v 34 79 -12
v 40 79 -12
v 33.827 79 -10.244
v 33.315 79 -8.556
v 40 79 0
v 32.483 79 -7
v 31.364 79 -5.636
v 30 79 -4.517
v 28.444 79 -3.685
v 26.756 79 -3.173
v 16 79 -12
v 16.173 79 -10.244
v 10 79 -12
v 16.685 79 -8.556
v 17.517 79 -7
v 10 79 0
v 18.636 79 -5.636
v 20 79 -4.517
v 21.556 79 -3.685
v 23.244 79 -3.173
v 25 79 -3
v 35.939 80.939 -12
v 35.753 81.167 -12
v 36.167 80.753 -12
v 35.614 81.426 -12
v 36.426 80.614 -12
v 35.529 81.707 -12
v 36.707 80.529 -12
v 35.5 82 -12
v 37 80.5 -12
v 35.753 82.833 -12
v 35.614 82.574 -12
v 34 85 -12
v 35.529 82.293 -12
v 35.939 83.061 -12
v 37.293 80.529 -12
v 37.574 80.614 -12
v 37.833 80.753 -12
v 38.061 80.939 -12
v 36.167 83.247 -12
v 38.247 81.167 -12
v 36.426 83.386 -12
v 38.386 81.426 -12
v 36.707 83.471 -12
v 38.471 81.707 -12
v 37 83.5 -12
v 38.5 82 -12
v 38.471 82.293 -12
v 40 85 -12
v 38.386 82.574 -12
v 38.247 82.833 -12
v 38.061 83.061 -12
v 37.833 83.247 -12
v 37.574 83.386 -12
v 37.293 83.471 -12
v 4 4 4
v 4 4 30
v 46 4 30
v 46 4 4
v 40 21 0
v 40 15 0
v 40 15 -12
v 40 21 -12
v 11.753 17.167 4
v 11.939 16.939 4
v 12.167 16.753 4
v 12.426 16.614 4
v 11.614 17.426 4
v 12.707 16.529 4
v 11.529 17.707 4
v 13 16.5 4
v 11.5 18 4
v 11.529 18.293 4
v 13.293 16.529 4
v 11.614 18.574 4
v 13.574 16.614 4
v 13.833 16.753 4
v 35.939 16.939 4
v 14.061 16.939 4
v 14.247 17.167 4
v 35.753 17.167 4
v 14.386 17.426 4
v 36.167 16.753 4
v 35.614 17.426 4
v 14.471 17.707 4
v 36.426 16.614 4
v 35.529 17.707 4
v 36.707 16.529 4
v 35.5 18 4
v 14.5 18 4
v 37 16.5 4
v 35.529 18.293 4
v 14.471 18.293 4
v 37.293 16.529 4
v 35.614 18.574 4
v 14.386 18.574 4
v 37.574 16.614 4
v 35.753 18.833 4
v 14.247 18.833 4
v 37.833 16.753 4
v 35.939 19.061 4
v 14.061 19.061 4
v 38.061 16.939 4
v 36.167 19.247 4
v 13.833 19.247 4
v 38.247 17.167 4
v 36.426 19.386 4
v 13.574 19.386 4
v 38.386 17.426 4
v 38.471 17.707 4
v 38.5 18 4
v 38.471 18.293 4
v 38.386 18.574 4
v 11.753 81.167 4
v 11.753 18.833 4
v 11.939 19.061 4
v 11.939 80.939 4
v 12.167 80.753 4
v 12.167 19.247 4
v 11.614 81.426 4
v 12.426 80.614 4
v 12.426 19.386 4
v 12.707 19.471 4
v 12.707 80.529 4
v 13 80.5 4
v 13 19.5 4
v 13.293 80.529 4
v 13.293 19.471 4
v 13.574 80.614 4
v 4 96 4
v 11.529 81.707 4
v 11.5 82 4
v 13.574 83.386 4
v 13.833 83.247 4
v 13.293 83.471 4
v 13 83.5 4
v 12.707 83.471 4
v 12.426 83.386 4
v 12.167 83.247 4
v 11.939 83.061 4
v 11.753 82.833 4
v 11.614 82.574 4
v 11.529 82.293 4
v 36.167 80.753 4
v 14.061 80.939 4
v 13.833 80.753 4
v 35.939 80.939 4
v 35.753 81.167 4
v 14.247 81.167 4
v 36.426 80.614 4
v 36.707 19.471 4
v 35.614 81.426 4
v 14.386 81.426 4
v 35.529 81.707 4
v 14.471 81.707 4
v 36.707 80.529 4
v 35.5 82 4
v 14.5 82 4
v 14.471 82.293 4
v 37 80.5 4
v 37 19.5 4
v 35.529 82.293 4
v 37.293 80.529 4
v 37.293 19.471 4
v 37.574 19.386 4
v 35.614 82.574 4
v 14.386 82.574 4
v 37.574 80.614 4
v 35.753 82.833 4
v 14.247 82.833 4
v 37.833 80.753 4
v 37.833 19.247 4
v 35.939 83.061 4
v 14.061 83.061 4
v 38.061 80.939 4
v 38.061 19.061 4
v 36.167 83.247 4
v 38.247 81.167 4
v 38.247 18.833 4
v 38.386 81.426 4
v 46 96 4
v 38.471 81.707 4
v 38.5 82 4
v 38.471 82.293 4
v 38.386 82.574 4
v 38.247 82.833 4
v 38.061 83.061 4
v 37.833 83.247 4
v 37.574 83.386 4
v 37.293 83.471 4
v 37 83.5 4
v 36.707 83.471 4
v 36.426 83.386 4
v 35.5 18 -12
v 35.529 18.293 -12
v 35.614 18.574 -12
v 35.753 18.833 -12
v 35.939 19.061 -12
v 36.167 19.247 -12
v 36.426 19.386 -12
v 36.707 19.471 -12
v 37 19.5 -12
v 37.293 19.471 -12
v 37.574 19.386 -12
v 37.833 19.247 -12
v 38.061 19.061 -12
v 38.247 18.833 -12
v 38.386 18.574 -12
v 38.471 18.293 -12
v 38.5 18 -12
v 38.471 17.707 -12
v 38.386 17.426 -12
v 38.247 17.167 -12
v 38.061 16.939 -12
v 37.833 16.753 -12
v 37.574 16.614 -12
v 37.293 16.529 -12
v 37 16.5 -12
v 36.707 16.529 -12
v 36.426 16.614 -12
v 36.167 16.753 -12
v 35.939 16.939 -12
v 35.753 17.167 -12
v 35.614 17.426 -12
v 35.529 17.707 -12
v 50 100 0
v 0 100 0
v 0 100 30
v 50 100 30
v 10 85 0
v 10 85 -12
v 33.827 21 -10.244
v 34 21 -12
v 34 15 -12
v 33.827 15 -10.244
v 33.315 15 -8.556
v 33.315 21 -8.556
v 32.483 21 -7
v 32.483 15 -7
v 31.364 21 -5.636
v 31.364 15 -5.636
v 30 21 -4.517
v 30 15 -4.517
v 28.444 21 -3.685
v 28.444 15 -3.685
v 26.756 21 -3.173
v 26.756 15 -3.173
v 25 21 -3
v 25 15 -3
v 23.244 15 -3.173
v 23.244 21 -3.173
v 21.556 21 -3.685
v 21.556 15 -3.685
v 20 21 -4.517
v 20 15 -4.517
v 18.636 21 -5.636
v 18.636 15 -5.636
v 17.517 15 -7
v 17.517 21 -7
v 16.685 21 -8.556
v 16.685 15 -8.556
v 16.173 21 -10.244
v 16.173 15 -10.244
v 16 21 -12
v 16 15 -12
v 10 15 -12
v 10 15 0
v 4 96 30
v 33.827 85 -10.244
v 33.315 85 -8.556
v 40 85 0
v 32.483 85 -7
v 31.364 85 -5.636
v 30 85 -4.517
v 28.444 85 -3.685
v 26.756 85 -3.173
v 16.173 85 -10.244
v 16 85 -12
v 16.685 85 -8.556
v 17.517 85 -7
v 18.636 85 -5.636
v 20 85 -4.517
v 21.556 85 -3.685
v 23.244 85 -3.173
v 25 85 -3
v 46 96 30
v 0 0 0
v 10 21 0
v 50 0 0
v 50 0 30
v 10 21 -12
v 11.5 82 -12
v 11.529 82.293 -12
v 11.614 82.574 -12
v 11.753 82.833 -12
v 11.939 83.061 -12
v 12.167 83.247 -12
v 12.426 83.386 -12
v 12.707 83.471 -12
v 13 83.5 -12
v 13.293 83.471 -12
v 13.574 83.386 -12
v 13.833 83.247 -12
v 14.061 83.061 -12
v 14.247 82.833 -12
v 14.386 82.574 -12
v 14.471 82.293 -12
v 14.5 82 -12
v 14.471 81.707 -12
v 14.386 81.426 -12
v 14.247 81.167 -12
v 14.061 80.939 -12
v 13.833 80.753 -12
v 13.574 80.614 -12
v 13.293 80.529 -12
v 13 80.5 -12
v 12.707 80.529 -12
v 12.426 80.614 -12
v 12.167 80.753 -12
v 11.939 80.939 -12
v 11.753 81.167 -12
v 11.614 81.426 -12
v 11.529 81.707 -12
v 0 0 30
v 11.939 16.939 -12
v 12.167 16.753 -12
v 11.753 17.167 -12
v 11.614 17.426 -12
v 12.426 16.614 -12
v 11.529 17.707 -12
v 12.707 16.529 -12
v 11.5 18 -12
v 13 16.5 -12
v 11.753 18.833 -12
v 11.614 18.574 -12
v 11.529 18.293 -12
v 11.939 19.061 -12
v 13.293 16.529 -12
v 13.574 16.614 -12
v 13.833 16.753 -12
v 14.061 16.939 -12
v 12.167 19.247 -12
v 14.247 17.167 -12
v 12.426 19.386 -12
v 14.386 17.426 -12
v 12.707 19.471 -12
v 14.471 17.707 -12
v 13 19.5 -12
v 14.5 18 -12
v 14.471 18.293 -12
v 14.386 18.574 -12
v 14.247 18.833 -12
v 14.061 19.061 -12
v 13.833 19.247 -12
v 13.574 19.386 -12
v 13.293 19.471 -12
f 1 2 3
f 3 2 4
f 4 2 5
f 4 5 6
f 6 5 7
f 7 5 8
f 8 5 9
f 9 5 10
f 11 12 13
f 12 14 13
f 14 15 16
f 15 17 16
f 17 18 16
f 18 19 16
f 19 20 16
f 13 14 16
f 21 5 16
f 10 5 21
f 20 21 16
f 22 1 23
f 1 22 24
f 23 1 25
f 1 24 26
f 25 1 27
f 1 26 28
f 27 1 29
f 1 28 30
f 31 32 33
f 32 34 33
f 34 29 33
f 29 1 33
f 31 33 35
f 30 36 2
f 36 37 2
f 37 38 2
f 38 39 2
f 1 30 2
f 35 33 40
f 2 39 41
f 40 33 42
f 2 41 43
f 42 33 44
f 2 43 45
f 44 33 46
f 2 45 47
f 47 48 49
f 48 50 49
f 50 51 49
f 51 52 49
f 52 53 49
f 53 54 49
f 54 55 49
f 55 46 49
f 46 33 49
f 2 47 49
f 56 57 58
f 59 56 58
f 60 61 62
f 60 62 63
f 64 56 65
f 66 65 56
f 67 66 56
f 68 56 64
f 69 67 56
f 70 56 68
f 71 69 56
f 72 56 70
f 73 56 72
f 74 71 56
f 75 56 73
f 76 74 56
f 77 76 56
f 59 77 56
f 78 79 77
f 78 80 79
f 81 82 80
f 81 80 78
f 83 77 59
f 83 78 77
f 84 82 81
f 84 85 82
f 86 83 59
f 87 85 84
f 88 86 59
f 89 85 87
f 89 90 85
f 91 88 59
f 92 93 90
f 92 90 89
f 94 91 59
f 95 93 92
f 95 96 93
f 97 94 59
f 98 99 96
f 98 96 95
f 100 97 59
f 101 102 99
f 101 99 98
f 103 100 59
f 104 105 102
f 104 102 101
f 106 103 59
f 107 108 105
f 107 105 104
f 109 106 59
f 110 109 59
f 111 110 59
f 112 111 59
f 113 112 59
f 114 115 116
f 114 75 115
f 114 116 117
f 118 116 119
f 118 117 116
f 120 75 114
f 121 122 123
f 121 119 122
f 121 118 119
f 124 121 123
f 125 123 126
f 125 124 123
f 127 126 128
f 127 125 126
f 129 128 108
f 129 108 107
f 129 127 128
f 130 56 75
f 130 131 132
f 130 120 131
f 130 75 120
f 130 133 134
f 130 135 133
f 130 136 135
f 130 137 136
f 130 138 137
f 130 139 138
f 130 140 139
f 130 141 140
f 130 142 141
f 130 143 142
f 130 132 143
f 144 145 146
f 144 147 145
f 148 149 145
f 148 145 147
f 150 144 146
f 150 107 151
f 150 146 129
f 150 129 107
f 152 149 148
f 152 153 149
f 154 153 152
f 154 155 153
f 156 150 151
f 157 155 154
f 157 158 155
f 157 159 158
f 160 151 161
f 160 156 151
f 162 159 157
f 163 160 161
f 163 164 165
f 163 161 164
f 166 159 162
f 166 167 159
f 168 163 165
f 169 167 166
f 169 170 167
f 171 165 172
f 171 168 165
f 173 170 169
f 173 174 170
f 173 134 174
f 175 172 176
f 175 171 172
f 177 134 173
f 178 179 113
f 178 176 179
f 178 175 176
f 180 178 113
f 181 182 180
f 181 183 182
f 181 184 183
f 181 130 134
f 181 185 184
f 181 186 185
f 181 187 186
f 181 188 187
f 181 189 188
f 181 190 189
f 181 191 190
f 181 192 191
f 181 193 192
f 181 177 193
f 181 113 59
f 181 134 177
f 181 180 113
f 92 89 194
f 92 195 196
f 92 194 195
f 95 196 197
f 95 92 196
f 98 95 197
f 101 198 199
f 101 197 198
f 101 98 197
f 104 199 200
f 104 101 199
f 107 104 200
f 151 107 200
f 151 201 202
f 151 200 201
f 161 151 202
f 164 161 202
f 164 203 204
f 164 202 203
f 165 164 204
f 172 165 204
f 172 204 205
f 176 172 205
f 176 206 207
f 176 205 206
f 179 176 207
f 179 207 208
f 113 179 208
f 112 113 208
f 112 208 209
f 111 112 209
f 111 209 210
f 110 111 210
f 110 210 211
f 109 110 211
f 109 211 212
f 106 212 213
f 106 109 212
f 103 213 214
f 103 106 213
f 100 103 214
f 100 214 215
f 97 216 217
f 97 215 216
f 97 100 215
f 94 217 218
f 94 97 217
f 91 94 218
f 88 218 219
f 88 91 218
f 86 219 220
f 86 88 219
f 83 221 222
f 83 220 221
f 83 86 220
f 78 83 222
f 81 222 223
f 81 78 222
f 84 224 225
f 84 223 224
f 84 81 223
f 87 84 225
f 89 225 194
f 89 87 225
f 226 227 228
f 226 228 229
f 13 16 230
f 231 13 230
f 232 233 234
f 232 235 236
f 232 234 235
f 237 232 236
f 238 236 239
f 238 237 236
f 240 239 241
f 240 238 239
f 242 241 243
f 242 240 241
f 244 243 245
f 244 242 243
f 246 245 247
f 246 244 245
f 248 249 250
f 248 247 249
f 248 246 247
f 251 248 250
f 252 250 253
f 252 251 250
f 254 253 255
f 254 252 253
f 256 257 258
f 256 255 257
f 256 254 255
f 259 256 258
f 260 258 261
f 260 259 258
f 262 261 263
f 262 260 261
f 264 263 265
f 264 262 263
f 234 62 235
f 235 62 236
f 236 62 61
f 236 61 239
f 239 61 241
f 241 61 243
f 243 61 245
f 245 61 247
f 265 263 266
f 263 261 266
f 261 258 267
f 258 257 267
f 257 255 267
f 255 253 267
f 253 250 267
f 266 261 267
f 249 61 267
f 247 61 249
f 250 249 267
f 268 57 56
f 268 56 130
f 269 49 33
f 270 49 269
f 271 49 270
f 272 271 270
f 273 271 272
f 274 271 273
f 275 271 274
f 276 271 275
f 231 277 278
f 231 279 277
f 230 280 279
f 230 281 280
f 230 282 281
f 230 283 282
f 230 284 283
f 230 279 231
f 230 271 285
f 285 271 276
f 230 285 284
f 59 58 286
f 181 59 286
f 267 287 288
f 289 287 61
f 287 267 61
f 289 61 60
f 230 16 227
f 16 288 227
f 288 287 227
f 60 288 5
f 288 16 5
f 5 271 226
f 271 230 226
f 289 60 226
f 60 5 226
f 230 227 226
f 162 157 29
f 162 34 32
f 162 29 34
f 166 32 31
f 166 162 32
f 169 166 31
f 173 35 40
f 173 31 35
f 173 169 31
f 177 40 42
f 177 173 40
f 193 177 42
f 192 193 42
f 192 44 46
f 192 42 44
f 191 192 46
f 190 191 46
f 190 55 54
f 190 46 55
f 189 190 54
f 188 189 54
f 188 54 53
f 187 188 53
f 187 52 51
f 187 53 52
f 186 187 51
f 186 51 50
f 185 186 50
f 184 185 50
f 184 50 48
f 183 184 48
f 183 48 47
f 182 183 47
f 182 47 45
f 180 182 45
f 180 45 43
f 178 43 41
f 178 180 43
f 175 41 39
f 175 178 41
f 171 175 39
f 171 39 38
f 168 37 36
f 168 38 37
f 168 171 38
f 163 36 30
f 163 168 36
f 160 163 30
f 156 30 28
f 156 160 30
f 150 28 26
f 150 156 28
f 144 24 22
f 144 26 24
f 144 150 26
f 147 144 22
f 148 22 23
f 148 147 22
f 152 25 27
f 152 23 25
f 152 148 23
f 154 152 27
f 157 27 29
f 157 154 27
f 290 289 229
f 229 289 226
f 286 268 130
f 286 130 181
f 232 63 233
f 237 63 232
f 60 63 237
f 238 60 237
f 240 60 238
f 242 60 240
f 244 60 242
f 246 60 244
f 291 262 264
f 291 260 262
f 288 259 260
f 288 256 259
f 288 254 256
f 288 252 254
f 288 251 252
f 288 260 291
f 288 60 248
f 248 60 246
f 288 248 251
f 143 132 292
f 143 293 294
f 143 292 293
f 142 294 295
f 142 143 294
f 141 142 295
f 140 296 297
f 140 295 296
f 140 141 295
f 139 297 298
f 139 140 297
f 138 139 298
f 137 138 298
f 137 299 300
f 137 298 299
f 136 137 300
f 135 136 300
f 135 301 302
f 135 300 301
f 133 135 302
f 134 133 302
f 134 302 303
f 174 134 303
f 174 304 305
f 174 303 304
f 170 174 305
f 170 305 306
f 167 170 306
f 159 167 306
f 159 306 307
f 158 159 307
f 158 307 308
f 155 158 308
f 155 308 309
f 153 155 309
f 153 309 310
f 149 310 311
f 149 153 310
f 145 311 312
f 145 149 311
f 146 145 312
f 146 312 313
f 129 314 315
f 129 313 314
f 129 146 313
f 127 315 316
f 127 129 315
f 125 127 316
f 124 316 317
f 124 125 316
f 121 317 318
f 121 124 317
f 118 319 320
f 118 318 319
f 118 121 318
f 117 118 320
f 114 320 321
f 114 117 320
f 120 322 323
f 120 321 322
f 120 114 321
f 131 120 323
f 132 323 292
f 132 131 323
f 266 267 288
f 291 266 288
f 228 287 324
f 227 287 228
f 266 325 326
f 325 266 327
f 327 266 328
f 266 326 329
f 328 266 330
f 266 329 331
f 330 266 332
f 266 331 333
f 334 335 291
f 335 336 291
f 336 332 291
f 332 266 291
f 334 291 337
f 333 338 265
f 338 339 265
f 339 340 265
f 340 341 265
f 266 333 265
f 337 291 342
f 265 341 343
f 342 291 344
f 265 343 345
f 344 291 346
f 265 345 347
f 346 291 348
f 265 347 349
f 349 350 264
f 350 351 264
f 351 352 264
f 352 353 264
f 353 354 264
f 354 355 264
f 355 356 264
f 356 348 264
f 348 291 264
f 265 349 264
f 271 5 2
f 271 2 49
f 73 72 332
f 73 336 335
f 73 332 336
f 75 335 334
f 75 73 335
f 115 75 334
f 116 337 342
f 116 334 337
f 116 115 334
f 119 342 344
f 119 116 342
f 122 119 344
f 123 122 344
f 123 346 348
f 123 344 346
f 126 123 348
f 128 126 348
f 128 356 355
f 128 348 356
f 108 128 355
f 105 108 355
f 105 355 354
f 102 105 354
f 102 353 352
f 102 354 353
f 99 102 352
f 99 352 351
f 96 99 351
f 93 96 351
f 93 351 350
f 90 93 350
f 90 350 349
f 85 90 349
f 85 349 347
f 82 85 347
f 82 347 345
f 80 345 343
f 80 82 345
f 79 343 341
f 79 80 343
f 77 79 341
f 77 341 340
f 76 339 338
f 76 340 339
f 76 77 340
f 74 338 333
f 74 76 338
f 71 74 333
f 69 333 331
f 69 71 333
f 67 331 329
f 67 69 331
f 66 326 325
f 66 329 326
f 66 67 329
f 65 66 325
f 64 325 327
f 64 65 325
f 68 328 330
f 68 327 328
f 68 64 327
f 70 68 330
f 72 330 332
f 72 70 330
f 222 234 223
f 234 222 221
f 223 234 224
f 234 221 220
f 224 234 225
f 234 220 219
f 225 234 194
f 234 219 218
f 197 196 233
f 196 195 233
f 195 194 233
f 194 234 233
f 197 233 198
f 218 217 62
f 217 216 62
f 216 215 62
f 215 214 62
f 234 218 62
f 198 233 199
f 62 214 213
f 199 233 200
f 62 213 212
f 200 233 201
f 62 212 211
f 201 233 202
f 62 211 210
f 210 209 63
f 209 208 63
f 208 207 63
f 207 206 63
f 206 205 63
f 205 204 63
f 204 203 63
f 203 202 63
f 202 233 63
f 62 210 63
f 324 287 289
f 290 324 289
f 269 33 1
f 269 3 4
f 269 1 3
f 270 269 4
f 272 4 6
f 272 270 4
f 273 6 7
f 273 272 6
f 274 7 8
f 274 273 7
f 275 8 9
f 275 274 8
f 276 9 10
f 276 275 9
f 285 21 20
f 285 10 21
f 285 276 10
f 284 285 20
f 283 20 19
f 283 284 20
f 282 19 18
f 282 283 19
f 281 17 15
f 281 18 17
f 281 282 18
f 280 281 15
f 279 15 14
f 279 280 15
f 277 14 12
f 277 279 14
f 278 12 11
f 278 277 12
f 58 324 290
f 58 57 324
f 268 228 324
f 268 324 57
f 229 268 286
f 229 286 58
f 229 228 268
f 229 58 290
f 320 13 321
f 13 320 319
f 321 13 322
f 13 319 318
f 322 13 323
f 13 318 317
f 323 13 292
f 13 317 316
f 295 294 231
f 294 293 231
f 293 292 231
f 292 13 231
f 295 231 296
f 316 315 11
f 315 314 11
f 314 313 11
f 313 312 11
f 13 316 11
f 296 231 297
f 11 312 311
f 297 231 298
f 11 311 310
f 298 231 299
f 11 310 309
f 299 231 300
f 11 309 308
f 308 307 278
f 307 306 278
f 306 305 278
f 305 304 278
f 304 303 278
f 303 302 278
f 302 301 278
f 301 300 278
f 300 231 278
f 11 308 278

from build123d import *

# Parameters (mm, degrees)
SKETCH1_W               = 50
SKETCH1_H               = 100
BOSS_EXTRUDE1_DEPTH     = 30
SKETCH2_W               = 42
SKETCH2_H               = 92
CUT_EXTRUDE1_DEPTH      = 26
SKETCH3_W               = 30
SKETCH3_H               = 6
BOSS_EXTRUDE2_DEPTH     = 24
CUT_EXTRUDE2_DEPTH      = 104.07764064
CUT_EXTRUDE2_DEPTH_BACK = 104.07764064
SKETCH4_R               = 9
CUT_EXTRUDE3_DEPTH      = 125.161185561
CUT_EXTRUDE3_DEPTH_BACK = 125.161185561
SKETCH5_R               = 1.5
CUT_EXTRUDE4_DEPTH      = 104.07764064
CUT_EXTRUDE4_DEPTH_BACK = 104.07764064
SKETCH6_W               = 30
SKETCH6_H               = 12


with BuildPart() as part:
    # Sketch1 → Boss-Extrude1 (new body)
    with BuildSketch(Plane.XY):
        with Locations((25, 50)):
            Rectangle(SKETCH1_W, SKETCH1_H)
    extrude(amount=BOSS_EXTRUDE1_DEPTH)

    # Sketch2 → Cut-Extrude1 (cut)
    with BuildSketch(Plane.XY.offset(30)):
        with Locations((25, 50)):
            Rectangle(SKETCH2_W, SKETCH2_H)
    extrude(amount=-CUT_EXTRUDE1_DEPTH, mode=Mode.SUBTRACT)

    # Sketch3 → Boss-Extrude2 (add)
    with BuildSketch(Plane(origin=(0, 0, 0), x_dir=(-1, 0, 0), z_dir=(0, 0, -1))):
        with Locations((-25, 18)):
            Rectangle(SKETCH3_W, SKETCH3_H)
        with Locations((-25, 82)):
            Rectangle(SKETCH3_W, SKETCH3_H)
    extrude(amount=BOSS_EXTRUDE2_DEPTH)

    # Sketch4 → Cut-Extrude2 (cut, two sides: drawn at the far end of the back side and taken through both)
    with BuildSketch(Plane.XZ.offset(-15).offset(-CUT_EXTRUDE2_DEPTH_BACK)):
        with Locations((25, -12)):
            Circle(SKETCH4_R)
    extrude(amount=CUT_EXTRUDE2_DEPTH + CUT_EXTRUDE2_DEPTH_BACK, mode=Mode.SUBTRACT)

    # Sketch5 → Cut-Extrude3 (cut, two sides: drawn at the far end of the back side and taken through both)
    with BuildSketch(Plane(origin=(0, 0, -24), x_dir=(-1, 0, 0), z_dir=(0, 0, -1)).offset(-CUT_EXTRUDE3_DEPTH_BACK)):
        with Locations((-13, 18)):
            Circle(SKETCH5_R)
        with Locations((-37, 18)):
            Circle(SKETCH5_R)
        with Locations((-13, 82)):
            Circle(SKETCH5_R)
        with Locations((-37, 82)):
            Circle(SKETCH5_R)
    extrude(amount=CUT_EXTRUDE3_DEPTH + CUT_EXTRUDE3_DEPTH_BACK, mode=Mode.SUBTRACT)

    # Sketch6 → Cut-Extrude4 (cut, two sides: drawn at the far end of the back side and taken through both)
    with BuildSketch(Plane.XZ.offset(-15).offset(-CUT_EXTRUDE4_DEPTH_BACK)):
        with Locations((25, -18)):
            Rectangle(SKETCH6_W, SKETCH6_H)
    extrude(amount=CUT_EXTRUDE4_DEPTH + CUT_EXTRUDE4_DEPTH_BACK, mode=Mode.SUBTRACT)


solid = part.part
